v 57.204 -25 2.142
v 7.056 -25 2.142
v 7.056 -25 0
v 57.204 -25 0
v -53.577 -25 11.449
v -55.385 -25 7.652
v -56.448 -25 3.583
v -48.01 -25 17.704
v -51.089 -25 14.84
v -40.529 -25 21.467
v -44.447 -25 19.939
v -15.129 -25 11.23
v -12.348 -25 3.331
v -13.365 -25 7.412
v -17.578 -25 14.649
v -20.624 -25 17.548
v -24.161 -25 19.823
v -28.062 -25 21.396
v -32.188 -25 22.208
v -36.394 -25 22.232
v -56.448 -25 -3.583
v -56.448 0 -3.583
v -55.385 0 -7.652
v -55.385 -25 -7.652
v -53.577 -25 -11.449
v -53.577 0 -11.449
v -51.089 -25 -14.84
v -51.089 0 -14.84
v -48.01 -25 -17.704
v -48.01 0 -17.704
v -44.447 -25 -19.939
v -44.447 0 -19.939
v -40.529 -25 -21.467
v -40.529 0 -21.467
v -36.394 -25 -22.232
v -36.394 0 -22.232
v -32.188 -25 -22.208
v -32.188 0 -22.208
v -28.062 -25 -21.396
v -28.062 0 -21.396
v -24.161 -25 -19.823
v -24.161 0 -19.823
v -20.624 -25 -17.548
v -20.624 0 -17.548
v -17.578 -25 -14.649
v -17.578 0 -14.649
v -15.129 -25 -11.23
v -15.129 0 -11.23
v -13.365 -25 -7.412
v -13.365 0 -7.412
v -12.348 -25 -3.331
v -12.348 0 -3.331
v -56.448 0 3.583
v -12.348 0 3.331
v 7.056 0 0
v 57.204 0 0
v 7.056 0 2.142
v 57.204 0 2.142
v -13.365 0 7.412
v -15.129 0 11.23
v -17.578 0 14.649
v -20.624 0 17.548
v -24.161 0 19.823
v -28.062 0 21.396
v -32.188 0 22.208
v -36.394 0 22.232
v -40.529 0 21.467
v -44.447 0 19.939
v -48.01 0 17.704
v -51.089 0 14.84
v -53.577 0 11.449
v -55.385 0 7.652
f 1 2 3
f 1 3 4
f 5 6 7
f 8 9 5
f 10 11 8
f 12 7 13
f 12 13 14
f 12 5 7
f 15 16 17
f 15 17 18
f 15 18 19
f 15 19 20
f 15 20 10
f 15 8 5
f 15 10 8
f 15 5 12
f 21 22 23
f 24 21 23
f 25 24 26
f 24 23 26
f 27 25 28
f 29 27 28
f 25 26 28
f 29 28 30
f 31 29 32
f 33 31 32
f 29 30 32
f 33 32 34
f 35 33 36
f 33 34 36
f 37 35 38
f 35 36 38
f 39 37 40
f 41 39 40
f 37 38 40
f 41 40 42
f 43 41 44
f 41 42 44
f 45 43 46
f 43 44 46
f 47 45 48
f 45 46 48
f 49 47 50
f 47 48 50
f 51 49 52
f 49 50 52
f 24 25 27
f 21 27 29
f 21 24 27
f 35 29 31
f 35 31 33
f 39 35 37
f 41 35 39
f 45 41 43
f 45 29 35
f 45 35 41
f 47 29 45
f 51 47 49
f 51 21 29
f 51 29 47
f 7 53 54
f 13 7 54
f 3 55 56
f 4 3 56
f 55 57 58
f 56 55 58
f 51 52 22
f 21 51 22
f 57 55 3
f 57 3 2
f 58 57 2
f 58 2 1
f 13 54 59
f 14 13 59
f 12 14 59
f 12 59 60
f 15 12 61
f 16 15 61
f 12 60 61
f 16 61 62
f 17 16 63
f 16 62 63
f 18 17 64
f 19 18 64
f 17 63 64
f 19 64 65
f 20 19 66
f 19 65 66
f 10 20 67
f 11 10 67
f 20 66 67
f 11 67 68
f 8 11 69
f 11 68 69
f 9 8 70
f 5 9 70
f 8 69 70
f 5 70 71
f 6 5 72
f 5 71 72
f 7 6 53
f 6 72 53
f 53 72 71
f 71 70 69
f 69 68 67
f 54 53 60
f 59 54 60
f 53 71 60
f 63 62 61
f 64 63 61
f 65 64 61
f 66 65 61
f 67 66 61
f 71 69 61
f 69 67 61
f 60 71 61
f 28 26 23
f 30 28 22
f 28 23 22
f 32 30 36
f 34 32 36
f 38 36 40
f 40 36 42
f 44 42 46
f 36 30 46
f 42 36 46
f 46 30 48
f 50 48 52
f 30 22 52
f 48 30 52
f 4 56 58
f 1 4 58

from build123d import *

# Parameters (mm, degrees)
F0_W     = 50.148003
F0_H     = 2.142
F1_DEPTH = 25


with BuildPart() as f1:
    # F0 (on Front) → F1 (new body)
    with BuildSketch(Plane.XZ):
        with BuildLine():
            Line((-56.448001, 3.583067), (-12.348001, 3.331068))
            ThreePointArc((-12.348001, 3.331068), (-34.290217, 22.31936), (-56.448001, 3.583067))
        make_face()
        with BuildLine():
            Line((-12.348001, -3.331068), (-56.448001, -3.583067))
            ThreePointArc((-56.448001, -3.583067), (-34.290217, -22.31936), (-12.348001, -3.331068))
        make_face()
        with Locations((32.130002, 1.071)):
            Rectangle(F0_W, F0_H)
    extrude(amount=F1_DEPTH)


solid = f1.part
